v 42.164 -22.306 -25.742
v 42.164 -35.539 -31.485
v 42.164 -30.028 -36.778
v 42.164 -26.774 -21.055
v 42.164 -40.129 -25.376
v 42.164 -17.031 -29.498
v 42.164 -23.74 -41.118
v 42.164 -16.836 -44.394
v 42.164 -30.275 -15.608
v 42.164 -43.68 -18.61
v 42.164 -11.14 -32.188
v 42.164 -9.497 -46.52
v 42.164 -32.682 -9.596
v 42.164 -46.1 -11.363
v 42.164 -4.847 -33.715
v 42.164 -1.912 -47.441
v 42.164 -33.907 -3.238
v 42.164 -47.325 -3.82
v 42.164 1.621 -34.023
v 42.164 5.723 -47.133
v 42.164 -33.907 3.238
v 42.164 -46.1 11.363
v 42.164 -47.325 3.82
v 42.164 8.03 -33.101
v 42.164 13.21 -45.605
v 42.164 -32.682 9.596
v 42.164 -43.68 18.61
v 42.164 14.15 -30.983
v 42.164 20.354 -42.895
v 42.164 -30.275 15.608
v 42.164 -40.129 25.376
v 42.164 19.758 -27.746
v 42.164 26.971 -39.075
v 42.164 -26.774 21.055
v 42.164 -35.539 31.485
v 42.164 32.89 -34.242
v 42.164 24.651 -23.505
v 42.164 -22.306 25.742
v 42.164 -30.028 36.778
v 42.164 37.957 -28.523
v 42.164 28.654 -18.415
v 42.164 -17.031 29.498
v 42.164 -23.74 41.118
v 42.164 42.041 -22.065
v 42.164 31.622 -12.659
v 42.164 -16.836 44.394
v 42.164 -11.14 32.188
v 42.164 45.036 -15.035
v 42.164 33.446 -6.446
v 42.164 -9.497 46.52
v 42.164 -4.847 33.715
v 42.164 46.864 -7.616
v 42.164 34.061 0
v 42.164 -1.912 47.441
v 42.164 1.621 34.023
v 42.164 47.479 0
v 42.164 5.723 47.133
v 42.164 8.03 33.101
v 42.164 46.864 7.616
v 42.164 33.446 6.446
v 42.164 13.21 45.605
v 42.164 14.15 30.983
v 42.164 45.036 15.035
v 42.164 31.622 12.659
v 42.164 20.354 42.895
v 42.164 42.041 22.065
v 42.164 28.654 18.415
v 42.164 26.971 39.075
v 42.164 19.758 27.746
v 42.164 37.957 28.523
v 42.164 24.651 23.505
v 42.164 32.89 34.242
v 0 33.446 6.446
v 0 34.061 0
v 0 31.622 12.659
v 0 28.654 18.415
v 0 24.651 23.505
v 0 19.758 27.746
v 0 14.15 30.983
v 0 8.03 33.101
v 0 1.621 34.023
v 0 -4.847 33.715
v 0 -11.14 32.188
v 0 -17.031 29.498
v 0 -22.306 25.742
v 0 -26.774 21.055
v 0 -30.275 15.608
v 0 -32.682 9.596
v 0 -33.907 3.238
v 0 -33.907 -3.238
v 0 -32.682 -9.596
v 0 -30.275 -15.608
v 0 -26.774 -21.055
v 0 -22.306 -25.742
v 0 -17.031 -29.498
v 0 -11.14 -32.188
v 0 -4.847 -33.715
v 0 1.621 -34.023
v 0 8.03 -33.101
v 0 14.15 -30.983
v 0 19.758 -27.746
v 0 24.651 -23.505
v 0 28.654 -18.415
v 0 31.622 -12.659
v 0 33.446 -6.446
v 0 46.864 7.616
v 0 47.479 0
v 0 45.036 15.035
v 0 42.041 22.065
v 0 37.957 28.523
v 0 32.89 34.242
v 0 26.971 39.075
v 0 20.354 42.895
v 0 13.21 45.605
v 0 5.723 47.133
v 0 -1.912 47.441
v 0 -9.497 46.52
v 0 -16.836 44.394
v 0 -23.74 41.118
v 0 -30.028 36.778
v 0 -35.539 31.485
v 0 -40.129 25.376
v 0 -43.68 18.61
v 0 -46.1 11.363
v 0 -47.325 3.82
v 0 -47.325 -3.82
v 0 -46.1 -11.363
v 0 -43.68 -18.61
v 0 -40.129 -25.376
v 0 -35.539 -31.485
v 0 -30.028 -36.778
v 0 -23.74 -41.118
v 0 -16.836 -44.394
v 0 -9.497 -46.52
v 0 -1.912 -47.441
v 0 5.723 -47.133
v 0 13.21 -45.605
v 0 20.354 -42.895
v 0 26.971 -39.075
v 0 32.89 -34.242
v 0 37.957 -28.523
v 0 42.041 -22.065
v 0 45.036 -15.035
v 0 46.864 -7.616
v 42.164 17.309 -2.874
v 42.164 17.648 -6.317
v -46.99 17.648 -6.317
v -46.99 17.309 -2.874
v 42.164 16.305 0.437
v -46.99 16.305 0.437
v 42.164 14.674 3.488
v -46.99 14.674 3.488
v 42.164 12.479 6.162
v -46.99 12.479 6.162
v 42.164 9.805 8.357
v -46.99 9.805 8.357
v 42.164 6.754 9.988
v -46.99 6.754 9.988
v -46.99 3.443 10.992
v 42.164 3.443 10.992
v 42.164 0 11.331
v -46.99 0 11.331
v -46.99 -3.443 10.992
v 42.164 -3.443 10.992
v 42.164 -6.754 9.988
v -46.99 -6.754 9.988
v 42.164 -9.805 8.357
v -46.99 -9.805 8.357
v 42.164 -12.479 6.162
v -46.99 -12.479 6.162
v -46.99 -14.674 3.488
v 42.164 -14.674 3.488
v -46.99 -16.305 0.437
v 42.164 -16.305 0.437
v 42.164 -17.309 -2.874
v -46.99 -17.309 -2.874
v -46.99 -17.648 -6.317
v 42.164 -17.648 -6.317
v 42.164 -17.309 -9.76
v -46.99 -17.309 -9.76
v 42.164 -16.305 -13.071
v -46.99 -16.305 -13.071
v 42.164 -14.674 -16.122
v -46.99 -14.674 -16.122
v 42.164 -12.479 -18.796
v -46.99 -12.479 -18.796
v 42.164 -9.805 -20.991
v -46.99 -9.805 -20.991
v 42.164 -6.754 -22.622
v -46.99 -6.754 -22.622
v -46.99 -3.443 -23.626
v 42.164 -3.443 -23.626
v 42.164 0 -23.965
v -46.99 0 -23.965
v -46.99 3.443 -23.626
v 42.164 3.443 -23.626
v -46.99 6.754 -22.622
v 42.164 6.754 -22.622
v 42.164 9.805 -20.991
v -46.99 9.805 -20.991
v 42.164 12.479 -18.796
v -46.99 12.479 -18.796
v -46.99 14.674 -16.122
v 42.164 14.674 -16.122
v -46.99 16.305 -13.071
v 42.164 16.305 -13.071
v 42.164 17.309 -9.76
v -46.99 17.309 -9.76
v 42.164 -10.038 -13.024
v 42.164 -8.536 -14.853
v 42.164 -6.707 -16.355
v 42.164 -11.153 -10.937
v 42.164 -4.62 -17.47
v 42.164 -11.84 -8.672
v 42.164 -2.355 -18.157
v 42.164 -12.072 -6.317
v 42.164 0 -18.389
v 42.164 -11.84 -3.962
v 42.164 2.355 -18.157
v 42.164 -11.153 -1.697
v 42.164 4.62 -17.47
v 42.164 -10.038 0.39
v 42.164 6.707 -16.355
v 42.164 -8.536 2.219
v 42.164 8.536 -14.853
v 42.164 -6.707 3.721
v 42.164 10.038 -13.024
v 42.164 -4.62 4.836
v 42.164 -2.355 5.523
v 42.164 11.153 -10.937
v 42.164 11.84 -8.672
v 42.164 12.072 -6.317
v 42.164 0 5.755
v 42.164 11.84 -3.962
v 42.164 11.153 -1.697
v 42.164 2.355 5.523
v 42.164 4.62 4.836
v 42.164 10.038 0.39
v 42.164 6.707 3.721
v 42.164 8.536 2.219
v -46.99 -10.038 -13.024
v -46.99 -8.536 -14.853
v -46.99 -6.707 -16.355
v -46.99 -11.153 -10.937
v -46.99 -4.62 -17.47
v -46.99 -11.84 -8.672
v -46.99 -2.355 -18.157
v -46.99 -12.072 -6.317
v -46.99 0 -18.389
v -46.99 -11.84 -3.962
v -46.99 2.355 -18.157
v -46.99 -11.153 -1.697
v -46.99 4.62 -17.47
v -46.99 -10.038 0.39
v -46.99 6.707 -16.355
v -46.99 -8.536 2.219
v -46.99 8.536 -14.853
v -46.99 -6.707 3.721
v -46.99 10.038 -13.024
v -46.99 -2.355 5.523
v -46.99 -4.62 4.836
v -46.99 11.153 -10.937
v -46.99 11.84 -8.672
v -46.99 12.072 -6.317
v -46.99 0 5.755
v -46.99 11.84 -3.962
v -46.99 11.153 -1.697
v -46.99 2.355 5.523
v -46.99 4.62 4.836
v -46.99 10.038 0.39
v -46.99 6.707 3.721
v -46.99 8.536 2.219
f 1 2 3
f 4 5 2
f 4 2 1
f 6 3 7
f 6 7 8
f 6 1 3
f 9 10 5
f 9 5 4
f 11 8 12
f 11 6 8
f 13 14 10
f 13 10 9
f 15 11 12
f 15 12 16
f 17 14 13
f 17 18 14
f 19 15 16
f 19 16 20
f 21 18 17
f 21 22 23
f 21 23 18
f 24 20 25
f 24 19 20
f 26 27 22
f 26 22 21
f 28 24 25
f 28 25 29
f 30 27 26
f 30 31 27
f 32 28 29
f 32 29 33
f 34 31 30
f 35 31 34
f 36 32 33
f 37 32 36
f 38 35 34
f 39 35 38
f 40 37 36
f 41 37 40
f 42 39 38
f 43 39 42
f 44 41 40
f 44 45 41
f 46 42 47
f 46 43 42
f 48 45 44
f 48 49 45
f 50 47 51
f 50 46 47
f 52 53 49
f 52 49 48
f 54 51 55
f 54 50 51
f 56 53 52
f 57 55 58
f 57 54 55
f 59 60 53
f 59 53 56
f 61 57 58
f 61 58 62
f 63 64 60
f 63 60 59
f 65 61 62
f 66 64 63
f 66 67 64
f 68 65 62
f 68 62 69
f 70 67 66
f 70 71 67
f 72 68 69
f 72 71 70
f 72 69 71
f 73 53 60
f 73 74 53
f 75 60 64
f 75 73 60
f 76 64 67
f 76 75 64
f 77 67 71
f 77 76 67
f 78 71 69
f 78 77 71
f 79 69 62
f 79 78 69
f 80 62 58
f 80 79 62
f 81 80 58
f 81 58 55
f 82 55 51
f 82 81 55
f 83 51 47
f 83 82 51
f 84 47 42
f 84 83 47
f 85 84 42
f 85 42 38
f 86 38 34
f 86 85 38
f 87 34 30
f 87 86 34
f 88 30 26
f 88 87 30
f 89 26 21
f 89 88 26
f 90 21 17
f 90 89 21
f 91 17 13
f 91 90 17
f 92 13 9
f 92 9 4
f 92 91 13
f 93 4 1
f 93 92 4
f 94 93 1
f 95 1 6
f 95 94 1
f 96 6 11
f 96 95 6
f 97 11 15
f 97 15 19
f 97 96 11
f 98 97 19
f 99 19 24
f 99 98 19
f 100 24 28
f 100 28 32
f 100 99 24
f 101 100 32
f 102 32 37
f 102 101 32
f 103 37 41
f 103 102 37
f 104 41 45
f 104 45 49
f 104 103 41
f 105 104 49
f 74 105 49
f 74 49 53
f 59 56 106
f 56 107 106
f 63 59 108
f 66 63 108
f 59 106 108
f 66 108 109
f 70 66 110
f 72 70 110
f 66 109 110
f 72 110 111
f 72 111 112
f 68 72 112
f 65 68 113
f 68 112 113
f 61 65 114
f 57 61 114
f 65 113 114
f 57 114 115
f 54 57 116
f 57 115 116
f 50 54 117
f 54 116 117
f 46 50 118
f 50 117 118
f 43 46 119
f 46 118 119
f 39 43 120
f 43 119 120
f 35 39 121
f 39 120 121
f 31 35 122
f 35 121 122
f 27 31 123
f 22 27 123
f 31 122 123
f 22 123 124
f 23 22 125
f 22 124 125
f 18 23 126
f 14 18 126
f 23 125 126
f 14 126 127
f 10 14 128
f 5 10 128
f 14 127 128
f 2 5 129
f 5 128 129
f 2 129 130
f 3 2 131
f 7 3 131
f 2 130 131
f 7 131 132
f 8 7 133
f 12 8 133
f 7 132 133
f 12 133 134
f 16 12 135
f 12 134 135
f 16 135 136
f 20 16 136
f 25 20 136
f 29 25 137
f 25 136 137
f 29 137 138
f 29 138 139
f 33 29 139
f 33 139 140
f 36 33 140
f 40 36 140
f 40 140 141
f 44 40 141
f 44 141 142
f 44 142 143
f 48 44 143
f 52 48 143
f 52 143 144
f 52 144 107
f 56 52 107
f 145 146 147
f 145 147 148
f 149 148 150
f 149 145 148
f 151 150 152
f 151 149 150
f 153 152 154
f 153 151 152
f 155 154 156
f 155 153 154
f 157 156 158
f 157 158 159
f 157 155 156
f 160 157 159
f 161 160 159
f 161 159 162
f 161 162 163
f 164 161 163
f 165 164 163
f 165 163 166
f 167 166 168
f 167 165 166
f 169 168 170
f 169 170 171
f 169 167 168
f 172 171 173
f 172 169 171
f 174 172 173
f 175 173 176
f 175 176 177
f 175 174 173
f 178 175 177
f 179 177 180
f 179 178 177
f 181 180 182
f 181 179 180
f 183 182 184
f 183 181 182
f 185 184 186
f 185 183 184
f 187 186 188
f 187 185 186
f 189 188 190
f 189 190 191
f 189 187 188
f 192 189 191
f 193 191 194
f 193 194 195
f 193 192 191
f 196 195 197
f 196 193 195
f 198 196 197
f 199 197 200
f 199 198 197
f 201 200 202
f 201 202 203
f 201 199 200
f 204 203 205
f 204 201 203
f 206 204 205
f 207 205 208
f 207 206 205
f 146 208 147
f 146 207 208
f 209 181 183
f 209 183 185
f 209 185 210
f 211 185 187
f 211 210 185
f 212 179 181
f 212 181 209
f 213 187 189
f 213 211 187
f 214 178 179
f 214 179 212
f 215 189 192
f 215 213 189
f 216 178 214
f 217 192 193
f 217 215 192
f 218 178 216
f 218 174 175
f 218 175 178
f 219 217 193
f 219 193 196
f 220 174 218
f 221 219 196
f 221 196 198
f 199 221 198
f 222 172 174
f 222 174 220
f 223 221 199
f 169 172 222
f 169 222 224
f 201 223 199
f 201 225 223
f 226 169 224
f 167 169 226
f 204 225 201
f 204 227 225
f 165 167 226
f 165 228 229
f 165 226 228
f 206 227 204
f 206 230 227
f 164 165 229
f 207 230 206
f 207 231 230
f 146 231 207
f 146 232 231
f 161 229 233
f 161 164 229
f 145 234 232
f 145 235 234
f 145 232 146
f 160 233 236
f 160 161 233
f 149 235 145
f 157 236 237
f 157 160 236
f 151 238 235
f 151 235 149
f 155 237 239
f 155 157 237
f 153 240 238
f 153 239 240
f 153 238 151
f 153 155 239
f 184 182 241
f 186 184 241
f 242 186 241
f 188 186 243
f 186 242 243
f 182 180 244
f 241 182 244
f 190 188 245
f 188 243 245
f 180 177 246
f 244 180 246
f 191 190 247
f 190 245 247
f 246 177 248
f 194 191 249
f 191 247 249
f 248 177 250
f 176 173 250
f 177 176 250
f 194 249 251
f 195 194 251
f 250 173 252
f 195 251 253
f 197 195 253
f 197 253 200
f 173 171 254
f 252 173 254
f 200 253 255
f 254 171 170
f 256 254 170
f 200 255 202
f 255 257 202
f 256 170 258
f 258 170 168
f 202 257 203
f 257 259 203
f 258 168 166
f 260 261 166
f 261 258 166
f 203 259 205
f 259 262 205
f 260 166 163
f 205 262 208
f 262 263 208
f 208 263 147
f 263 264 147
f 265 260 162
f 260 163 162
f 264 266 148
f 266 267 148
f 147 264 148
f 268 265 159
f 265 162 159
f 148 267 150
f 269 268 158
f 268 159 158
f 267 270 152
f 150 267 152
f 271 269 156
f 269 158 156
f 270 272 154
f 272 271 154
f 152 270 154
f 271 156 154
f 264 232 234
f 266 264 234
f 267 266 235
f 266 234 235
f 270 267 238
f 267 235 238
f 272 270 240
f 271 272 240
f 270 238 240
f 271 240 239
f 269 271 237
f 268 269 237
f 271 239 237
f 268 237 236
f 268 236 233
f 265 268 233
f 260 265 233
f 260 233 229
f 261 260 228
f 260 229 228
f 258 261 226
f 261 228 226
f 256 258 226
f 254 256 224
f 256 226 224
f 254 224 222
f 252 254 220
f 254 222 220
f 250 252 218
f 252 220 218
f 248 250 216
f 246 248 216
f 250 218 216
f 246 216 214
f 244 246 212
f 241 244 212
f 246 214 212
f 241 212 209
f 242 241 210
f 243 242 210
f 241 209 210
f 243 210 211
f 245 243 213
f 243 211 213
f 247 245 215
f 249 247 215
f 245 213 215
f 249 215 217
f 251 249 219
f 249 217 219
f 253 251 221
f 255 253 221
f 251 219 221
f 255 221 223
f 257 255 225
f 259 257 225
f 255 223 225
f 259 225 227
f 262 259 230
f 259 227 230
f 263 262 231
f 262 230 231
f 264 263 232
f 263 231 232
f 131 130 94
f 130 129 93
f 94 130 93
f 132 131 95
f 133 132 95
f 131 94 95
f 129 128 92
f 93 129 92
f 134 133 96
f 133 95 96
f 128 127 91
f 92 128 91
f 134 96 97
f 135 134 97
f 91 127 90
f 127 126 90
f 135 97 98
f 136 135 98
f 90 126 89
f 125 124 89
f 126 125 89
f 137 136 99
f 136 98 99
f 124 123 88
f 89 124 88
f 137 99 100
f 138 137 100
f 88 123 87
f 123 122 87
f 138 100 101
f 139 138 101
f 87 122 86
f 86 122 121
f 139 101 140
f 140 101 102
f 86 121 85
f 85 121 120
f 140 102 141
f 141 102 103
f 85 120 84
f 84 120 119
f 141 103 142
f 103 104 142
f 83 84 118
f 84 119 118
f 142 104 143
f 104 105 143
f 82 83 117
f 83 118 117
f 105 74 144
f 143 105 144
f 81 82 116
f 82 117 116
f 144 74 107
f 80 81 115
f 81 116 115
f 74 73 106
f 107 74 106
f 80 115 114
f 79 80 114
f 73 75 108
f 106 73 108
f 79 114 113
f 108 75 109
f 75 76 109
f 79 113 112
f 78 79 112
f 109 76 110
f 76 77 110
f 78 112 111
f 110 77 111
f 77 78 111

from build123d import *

# Parameters (mm, degrees)
F0_R        = 47.479265
F0_R_2      = 34.061459
F1_DEPTH    = 16.764
F1_FACE_R   = 47.479265
F1_FACE_R_2 = 34.061459
F2_DEPTH    = 25.4
F3_R        = 17.64841
F3_R_2      = 12.072105
F4_DEPTH    = 89.154


with BuildPart() as f1:
    # F0 (on Right) → F1 (new body)
    with BuildSketch(Plane.YZ):
        Circle(F0_R)
        Circle(F0_R_2, mode=Mode.SUBTRACT)
    extrude(amount=F1_DEPTH)

    # F1_face (on face) → F2 (join)
    with BuildSketch(Plane.YZ.offset(16.764)):
        Circle(F1_FACE_R)
        Circle(F1_FACE_R_2, mode=Mode.SUBTRACT)
    extrude(amount=F2_DEPTH)


with BuildPart() as f4:
    # F3 (on face) → F4 (new body)
    with BuildSketch(Plane.YZ.offset(42.164)):
        with Locations((0, -6.317003)):
            Circle(F3_R)
        with Locations((0, -6.317003)):
            Circle(F3_R_2, mode=Mode.SUBTRACT)
    extrude(amount=-F4_DEPTH)


solid = Compound([f1.part, f4.part])
